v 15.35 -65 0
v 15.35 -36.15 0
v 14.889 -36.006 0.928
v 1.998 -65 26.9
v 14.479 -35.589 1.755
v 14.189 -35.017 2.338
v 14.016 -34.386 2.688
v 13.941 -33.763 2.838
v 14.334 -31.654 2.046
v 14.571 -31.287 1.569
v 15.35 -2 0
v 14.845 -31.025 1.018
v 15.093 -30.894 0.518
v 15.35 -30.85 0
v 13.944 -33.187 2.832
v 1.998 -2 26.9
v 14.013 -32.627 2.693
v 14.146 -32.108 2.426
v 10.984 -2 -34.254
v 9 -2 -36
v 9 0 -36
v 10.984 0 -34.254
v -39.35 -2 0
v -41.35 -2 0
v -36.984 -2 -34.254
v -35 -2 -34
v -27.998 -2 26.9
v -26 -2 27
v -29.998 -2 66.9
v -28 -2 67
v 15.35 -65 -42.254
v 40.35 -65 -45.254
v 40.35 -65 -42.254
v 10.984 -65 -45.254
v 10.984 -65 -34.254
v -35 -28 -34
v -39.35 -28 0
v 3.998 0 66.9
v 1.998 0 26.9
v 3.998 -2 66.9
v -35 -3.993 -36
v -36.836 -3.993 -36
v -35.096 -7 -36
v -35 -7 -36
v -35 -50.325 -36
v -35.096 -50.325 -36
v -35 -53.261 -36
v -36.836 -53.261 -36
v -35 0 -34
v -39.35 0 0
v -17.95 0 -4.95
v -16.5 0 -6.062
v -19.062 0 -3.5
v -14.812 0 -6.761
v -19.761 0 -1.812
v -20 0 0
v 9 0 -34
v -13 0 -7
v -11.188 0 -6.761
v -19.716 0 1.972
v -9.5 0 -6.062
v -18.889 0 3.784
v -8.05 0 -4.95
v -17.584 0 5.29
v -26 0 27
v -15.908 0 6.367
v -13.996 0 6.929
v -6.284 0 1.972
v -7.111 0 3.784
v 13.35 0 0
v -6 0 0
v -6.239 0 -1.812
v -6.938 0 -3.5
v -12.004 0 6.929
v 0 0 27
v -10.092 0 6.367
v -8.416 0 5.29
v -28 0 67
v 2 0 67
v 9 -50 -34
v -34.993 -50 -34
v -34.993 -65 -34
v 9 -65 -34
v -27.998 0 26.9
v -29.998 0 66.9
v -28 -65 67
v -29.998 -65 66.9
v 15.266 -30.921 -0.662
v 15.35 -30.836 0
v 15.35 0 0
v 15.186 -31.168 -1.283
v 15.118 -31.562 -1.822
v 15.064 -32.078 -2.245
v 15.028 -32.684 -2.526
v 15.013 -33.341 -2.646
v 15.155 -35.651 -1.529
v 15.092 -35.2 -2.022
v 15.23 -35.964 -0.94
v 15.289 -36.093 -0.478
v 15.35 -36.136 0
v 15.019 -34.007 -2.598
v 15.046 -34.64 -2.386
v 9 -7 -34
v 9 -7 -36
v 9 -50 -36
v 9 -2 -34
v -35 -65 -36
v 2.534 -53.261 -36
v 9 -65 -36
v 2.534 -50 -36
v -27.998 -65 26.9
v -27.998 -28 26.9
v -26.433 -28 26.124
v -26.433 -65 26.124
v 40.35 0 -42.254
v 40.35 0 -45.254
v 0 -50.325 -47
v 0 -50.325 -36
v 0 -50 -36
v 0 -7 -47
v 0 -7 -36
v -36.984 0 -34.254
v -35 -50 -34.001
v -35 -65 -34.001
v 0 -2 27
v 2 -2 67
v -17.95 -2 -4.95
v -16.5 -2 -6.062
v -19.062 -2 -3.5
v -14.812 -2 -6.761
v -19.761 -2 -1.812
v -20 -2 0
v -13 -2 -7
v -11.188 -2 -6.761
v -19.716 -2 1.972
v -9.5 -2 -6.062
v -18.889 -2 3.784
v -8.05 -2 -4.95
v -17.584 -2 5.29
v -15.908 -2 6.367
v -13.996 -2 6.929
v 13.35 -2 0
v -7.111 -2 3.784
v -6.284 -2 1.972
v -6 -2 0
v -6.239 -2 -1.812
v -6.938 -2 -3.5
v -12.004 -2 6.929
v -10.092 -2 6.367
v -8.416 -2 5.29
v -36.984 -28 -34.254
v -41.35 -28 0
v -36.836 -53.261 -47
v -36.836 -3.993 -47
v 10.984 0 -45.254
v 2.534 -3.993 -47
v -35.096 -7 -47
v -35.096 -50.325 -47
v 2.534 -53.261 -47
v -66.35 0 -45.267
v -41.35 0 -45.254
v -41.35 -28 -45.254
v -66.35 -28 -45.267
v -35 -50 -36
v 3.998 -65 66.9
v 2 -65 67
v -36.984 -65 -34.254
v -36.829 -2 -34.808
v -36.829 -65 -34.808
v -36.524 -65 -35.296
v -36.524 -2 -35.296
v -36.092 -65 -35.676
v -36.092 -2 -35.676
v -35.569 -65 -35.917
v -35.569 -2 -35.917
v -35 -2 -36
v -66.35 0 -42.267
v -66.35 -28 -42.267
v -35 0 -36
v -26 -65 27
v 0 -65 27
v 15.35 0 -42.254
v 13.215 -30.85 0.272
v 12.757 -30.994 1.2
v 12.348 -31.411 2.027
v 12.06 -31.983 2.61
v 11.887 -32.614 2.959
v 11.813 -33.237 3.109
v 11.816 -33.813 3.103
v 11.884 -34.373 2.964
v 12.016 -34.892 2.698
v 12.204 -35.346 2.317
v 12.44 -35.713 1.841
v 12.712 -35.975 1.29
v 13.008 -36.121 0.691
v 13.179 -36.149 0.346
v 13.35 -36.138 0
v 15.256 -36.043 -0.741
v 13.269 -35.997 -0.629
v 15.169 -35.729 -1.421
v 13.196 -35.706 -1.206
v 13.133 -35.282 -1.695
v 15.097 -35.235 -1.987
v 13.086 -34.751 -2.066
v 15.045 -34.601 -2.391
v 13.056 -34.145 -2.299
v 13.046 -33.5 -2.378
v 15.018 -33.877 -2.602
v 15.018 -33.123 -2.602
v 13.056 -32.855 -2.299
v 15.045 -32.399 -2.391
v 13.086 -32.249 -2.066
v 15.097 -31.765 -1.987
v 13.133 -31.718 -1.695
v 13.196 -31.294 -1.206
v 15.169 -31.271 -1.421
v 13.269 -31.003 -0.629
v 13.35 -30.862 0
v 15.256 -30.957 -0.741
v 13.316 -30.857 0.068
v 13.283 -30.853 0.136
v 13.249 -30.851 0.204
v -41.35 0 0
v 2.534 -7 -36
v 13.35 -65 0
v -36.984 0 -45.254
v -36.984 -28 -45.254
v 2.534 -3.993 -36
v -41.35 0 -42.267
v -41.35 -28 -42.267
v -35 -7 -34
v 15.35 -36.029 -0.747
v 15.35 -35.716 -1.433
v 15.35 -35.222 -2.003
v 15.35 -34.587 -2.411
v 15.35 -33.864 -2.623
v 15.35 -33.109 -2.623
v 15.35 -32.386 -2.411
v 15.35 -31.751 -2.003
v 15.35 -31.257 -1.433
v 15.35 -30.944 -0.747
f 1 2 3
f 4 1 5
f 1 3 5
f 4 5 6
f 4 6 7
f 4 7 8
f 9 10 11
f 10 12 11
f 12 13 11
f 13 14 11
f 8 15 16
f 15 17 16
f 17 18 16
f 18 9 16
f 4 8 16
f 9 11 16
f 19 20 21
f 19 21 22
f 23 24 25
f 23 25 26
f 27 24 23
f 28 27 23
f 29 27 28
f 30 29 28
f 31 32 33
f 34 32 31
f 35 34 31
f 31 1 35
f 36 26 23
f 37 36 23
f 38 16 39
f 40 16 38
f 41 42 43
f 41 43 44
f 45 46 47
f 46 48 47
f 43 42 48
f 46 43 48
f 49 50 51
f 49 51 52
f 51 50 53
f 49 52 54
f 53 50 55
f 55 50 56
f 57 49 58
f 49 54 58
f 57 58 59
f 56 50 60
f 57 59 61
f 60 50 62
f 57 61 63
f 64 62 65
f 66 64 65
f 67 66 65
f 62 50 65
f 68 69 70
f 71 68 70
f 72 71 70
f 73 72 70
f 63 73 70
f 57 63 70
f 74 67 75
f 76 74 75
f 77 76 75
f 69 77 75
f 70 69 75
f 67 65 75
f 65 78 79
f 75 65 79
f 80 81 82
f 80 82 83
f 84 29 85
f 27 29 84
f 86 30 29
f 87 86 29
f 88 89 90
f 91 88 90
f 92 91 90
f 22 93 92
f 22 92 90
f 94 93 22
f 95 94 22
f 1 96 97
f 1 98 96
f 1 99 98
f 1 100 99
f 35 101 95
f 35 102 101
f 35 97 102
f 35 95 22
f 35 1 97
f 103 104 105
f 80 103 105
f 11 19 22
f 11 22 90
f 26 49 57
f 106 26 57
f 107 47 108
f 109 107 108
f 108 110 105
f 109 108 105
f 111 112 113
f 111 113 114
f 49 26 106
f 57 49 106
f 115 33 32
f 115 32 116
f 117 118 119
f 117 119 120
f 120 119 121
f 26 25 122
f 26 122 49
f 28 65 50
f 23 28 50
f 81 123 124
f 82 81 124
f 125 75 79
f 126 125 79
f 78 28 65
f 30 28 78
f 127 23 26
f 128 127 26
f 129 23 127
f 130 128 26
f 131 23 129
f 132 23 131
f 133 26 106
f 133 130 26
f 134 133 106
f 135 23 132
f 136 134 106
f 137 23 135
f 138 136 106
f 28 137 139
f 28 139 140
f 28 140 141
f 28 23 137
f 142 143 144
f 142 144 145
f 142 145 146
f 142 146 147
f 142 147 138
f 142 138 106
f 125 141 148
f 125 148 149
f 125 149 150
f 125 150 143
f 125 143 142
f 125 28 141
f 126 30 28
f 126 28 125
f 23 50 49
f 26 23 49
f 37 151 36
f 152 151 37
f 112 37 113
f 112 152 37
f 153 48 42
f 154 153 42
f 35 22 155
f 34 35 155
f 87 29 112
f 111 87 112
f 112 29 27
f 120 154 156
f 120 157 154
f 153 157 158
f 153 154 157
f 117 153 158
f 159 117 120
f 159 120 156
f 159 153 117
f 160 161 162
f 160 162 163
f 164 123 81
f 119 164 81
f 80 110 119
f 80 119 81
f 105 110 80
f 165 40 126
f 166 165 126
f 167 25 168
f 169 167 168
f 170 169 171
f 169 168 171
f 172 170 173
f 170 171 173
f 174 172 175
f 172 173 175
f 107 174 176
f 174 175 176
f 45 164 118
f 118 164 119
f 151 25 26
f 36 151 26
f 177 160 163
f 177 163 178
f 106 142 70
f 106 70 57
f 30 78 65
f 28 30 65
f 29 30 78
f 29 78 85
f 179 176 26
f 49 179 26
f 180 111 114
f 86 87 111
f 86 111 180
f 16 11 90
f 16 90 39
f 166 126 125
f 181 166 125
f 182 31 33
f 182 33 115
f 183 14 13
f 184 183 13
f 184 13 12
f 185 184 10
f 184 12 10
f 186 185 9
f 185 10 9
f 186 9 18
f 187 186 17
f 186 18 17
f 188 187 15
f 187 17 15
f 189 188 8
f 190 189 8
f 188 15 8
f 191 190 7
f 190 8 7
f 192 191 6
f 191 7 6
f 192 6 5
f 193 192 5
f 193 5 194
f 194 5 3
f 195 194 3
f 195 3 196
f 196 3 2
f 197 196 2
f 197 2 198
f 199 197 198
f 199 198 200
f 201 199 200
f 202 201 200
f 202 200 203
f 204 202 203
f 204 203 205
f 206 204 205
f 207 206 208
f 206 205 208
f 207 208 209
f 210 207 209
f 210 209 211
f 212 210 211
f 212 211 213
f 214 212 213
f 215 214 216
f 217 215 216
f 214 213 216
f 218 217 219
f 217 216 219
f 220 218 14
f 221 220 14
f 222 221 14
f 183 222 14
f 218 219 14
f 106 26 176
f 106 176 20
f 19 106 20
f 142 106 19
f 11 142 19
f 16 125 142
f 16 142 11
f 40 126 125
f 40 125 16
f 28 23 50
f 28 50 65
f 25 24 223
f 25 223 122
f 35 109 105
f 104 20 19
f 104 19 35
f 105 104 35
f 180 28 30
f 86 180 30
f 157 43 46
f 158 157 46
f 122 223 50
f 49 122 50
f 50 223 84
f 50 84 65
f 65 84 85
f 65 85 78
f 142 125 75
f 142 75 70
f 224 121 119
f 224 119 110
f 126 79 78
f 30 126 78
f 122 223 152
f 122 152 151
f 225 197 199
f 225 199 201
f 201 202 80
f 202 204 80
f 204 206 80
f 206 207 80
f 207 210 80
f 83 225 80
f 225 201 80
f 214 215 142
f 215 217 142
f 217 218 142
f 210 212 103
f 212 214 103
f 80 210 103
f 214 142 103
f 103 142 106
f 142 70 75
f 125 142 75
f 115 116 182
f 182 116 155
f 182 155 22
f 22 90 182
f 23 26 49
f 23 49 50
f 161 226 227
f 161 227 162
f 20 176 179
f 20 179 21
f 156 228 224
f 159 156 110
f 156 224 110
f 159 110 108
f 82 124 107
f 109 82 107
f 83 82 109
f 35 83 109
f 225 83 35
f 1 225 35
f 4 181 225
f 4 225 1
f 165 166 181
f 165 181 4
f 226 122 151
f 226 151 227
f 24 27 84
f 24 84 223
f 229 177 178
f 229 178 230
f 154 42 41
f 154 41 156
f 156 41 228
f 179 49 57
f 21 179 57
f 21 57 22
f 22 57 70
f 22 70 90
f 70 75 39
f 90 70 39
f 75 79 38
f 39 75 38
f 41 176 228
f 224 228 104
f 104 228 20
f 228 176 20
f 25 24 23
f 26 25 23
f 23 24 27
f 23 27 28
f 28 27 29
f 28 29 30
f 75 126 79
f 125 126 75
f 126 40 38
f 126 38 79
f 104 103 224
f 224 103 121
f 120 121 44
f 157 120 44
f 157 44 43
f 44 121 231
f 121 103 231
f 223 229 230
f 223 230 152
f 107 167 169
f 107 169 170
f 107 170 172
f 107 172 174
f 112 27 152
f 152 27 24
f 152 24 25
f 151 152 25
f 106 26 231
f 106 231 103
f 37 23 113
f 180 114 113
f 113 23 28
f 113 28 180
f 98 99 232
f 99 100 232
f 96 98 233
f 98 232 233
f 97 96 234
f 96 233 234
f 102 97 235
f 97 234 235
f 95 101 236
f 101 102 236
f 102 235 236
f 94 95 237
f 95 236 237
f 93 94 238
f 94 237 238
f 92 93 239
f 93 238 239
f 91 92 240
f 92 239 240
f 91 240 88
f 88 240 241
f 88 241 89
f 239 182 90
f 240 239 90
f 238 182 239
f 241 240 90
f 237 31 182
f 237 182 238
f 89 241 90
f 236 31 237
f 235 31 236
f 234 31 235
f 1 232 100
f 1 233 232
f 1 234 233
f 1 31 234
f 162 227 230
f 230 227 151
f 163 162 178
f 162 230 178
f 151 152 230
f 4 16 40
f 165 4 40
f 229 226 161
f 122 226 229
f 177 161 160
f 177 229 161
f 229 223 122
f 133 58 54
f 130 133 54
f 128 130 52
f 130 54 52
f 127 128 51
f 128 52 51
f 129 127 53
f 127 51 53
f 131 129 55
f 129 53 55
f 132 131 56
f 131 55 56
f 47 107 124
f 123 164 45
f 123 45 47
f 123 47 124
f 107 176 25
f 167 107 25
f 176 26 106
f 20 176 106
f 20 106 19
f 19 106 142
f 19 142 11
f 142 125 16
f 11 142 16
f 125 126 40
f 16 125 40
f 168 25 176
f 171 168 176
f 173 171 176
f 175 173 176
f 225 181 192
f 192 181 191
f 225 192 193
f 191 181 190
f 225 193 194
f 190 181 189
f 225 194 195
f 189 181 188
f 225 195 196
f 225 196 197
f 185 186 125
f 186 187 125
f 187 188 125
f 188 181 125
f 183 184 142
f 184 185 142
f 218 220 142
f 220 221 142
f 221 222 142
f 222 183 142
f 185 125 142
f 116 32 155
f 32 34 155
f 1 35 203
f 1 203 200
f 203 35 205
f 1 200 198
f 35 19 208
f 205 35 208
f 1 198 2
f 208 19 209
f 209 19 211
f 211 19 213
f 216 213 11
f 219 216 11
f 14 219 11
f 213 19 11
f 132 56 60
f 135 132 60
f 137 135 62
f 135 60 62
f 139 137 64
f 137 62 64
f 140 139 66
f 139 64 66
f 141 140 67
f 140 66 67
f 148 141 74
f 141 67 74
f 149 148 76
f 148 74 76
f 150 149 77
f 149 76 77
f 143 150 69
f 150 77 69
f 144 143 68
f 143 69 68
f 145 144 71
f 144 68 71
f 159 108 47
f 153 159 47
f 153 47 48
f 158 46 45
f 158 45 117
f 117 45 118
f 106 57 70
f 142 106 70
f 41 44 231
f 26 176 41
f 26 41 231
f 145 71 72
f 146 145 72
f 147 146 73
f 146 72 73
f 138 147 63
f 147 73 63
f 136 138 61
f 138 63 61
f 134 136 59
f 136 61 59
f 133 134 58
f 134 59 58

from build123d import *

# Parameters (mm, degrees)
F0_W      = 26
F0_H      = 40
F1_DEPTH  = 2
F3_DEPTH  = 63
F2_W      = 44
F2_H      = 2
F4_DEPTH  = 2
F5_W      = 37
F5_H      = 30.0317472646
F6_DEPTH  = 3
F7_W      = 37
F7_H      = 34.5309597718
F8_DEPTH  = 3
F10_DEPTH = 5
F12_DEPTH = 65
F13_W     = 65
F13_H     = 3
F14_DEPTH = 25
F16_DEPTH = 28
F18_DEPTH = 5
F19_W     = 44
F19_H     = 43
F20_DEPTH = 3
F22_DEPTH = 11


# Not quite as in the source:
# - a feature names something its author has since deleted; it is built from what else it names


with BuildPart() as f1:
    # F0 (on Front) → F1 (new body)
    with BuildSketch(Plane.XZ):
        with Locations((-13, 47)):
            Rectangle(F0_W, F0_H)
        Polygon((-28, 67), (-26, 27), (-26, 67), align=None)
        Polygon((0, 67), (0, 27), (2, 67), align=None)
        with BuildLine():
            Line((-6, 0), (0, 0))
            Line((0, 0), (0, 27))
            Line((0, 27), (-26, 27))
            Line((-26, 27), (-26, 0))
            Line((-26, 0), (-20, 0))
            ThreePointArc((-20, 0), (-13, 7), (-6, 0))
        make_face()
        Polygon((-26, 0), (-26, 27), (-39.35, 0), align=None)
        Polygon((0, 27), (0, 0), (13.35, 0), align=None)
        Polygon((13.35, 0), (0, 0), (0, -34), (9, -34), align=None)
        with BuildLine():
            ThreePointArc((-13, -7), (-17.9497474683, -4.9497474683), (-20, 0))
            Line((-20, 0), (-26, 0))
            Line((-26, 0), (-26, -34))
            Line((-26, -34), (-13, -34))
            Line((-13, -34), (-13, -7))
        make_face()
        Polygon((-26, -34), (-26, 0), (-39.35, 0), (-35, -34), align=None)
        with BuildLine():
            Line((0, -34), (0, 0))
            Line((0, 0), (-6, 0))
            ThreePointArc((-6, 0), (-8.0502525317, -4.9497474683), (-13, -7))
            Line((-13, -7), (-13, -34))
            Line((-13, -34), (0, -34))
        make_face()
    extrude(amount=F1_DEPTH)


with BuildPart() as f3:
    # F2 (on face) → F3 (new body)
    with BuildSketch(Plane.XZ.offset(2)):
        Polygon((-26, 27), (-28, 67), (-29.9975046778, 66.9001247661), (-27.9975046778, 26.9001247661), align=None)
        Polygon((-39.35, 0), (-26, 27), (-27.9975046778, 26.9001247661), (-41.35, 0), align=None)
        Polygon((-35, -34), (-39.35, 0), (-41.35, 0), (-36.9838293096, -34.2538134558), align=None)
    extrude(amount=F3_DEPTH)


with BuildPart() as f3b:
    # F2 (on face) → F3, piece 2 (new body)
    with BuildSketch(Plane.XZ.offset(2)):
        Polygon((3.9975046778, 66.9001247661), (2, 67), (0, 27), (1.9975046778, 26.9001247661), align=None)
        Polygon((1.9975046778, 26.9001247661), (0, 27), (13.35, 0), (15.35, 0), align=None)
        Polygon((15.35, 0), (13.35, 0), (9, -34), (10.9838293096, -34.2538134558), align=None)
        with Locations((-13, -35)):
            Rectangle(F2_W, F2_H)
        Polygon((10.9838293096, -34.2538134558), (9, -34), (9, -36), align=None)
    extrude(amount=F3_DEPTH)


with BuildPart() as f3c:
    # F2 (on face) → F3, piece 3 (new body)
    with BuildSketch(Plane.XZ.offset(2)):
        with BuildLine():
            Line((-35, -36), (-36.9838293096, -34.2538134558))
            ThreePointArc((-36.9838293096, -34.2538134558), (-36.3214335187, -35.5012706138), (-35, -36))
        make_face()
    extrude(amount=F3_DEPTH)


with BuildPart() as f4:
    # F4 (new): a face of the model
    f4_faces = [f3b.part.faces().sort_by_distance(p)[0] for p in [
        (1.8524568997, -2, 46.957377155),
    ]]
    extrude(f4_faces, amount=F4_DEPTH)


with BuildPart() as f4b:
    # F4#2 (new): a face of the model
    f4_2_faces = [f3.part.faces().sort_by_distance(p)[0] for p in [
        (-32.9556846535, -2, 16.3675041089),
    ]]
    extrude(f4_2_faces, amount=F4_DEPTH)


with BuildPart() as f3_1:
    add(f3.part)

    # F5 (on face) → F6 (cut)
    with BuildSketch(Plane(origin=(-33.1759143884, 0, 16.4676277725), x_dir=(0, -1, 0), z_dir=(-0.8957229338, 0, 0.4446126695))):
        with Locations((46.5, -3.3688602532)):
            Rectangle(F5_W, F5_H)
    extrude(amount=-F6_DEPTH, mode=Mode.SUBTRACT)


with BuildPart() as f8_tool:
    # F7 (on face) → F8 (new body)
    with BuildSketch(Plane(origin=(-40.6889114508, 0, -5.1864220266), x_dir=(0, -1, 0), z_dir=(-0.9919739759, 0, -0.1264422049))):
        with Locations((46.5, -12.0370947138)):
            Rectangle(F7_W, F7_H)
    extrude(amount=-F8_DEPTH)


with BuildPart() as f3_2:
    add(f3_1.part)

    # F8: cut by f8_tool
    add(f8_tool.part, mode=Mode.SUBTRACT)


with BuildPart() as f3b_1:
    add(f3b.part)

    # F8: cut by f8_tool
    add(f8_tool.part, mode=Mode.SUBTRACT)

    # F9 (on face) → F10 (cut)
    with BuildSketch(Plane(origin=(15.1045898614, 0, -1.9253102323), x_dir=(0, 1, 0), z_dir=(0.9919739759, 0, -0.1264422049))):
        with BuildLine():
            ThreePointArc((-36.15, 1.940887845), (-33.5, -0.709112155), (-30.85, 1.940887845))
            Line((-30.85, 1.940887845), (-36.15, 1.940887845))
        make_face()
        with BuildLine():
            Line((-36.15, 1.940887845), (-30.85, 1.940887845))
            ThreePointArc((-30.85, 1.940887845), (-33.5, 4.590887845), (-36.15, 1.940887845))
        make_face()
    extrude(amount=-F10_DEPTH, mode=Mode.SUBTRACT)

    # F19 (on face) → F20 (cut)
    with BuildSketch(Plane(origin=(0, 0, -36), x_dir=(1, 0, 0), z_dir=(0, 0, -1))):
        with Locations((-13, 28.5)):
            Rectangle(F19_W, F19_H)
    extrude(amount=-F20_DEPTH, mode=Mode.SUBTRACT)

    # F21 (on face) → F22 (join)
    with BuildSketch(Plane(origin=(0, 0, -36), x_dir=(1, 0, 0), z_dir=(0, 0, -1))):
        Polygon((-35.0963361561, 7), (-35.0963361561, 50.3247156739), (0, 50.3247156739), (0, 7), (2.5343124289, 7), (2.5343124289, 53.2612130046), (-36.8364825845, 53.2612130046), (-36.8364825845, 3.993337974), (-35, 3.993337974), (-35, 7), align=None)
        Polygon((2.5343124289, 7), (0, 7), (-35, 7), (-35, 3.993337974), (2.5343124289, 3.993337974), align=None)
    extrude(amount=F22_DEPTH)


with BuildPart() as f12:
    # F11 (on face) → F12 (new body)
    with BuildSketch(Plane.XZ.offset(65)):
        Polygon((15.35, -45.2538134558), (15.35, 0), (10.9838293096, -34.2538134558), (10.9838293096, -45.2538134558), align=None)
    extrude(amount=-F12_DEPTH)

    # F13 (on face) → F14 (join)
    with BuildSketch(Plane.YZ.offset(15.35)):
        with Locations((-32.5, -43.7538134558)):
            Rectangle(F13_W, F13_H)
    extrude(amount=F14_DEPTH)

    # F17 (on face) → F18 (cut)
    with BuildSketch(Plane.YZ.offset(15.35)):
        with BuildLine():
            Line((-36.1364966571, 0), (-30.8364966571, 0))
            ThreePointArc((-30.8364966571, 0), (-33.4864966571, 2.65), (-36.1364966571, 0))
        make_face()
        with BuildLine():
            ThreePointArc((-36.1364966571, 0), (-33.4864966571, -2.65), (-30.8364966571, 0))
            Line((-30.8364966571, 0), (-36.1364966571, 0))
        make_face()
    extrude(amount=-F18_DEPTH, mode=Mode.SUBTRACT)


with BuildPart() as f16:
    # F15 (on face) → F16 (new body)
    with BuildSketch(Plane(origin=(0, 0, 0), x_dir=(-1, 0, 0), z_dir=(0, 1, 0))):
        Polygon((41.35, -42.2670417726), (41.35, 0), (36.9838293096, -34.2538134558), (36.9838293096, -45.2538134558), (41.35, -45.2538134558), (66.35, -45.2670417726), (66.35, -42.2670417726), align=None)
    extrude(amount=-F16_DEPTH)


solid = Compound([f1.part, f3c.part, f4.part, f4b.part, f3_2.part, f3b_1.part, f12.part, f16.part])
